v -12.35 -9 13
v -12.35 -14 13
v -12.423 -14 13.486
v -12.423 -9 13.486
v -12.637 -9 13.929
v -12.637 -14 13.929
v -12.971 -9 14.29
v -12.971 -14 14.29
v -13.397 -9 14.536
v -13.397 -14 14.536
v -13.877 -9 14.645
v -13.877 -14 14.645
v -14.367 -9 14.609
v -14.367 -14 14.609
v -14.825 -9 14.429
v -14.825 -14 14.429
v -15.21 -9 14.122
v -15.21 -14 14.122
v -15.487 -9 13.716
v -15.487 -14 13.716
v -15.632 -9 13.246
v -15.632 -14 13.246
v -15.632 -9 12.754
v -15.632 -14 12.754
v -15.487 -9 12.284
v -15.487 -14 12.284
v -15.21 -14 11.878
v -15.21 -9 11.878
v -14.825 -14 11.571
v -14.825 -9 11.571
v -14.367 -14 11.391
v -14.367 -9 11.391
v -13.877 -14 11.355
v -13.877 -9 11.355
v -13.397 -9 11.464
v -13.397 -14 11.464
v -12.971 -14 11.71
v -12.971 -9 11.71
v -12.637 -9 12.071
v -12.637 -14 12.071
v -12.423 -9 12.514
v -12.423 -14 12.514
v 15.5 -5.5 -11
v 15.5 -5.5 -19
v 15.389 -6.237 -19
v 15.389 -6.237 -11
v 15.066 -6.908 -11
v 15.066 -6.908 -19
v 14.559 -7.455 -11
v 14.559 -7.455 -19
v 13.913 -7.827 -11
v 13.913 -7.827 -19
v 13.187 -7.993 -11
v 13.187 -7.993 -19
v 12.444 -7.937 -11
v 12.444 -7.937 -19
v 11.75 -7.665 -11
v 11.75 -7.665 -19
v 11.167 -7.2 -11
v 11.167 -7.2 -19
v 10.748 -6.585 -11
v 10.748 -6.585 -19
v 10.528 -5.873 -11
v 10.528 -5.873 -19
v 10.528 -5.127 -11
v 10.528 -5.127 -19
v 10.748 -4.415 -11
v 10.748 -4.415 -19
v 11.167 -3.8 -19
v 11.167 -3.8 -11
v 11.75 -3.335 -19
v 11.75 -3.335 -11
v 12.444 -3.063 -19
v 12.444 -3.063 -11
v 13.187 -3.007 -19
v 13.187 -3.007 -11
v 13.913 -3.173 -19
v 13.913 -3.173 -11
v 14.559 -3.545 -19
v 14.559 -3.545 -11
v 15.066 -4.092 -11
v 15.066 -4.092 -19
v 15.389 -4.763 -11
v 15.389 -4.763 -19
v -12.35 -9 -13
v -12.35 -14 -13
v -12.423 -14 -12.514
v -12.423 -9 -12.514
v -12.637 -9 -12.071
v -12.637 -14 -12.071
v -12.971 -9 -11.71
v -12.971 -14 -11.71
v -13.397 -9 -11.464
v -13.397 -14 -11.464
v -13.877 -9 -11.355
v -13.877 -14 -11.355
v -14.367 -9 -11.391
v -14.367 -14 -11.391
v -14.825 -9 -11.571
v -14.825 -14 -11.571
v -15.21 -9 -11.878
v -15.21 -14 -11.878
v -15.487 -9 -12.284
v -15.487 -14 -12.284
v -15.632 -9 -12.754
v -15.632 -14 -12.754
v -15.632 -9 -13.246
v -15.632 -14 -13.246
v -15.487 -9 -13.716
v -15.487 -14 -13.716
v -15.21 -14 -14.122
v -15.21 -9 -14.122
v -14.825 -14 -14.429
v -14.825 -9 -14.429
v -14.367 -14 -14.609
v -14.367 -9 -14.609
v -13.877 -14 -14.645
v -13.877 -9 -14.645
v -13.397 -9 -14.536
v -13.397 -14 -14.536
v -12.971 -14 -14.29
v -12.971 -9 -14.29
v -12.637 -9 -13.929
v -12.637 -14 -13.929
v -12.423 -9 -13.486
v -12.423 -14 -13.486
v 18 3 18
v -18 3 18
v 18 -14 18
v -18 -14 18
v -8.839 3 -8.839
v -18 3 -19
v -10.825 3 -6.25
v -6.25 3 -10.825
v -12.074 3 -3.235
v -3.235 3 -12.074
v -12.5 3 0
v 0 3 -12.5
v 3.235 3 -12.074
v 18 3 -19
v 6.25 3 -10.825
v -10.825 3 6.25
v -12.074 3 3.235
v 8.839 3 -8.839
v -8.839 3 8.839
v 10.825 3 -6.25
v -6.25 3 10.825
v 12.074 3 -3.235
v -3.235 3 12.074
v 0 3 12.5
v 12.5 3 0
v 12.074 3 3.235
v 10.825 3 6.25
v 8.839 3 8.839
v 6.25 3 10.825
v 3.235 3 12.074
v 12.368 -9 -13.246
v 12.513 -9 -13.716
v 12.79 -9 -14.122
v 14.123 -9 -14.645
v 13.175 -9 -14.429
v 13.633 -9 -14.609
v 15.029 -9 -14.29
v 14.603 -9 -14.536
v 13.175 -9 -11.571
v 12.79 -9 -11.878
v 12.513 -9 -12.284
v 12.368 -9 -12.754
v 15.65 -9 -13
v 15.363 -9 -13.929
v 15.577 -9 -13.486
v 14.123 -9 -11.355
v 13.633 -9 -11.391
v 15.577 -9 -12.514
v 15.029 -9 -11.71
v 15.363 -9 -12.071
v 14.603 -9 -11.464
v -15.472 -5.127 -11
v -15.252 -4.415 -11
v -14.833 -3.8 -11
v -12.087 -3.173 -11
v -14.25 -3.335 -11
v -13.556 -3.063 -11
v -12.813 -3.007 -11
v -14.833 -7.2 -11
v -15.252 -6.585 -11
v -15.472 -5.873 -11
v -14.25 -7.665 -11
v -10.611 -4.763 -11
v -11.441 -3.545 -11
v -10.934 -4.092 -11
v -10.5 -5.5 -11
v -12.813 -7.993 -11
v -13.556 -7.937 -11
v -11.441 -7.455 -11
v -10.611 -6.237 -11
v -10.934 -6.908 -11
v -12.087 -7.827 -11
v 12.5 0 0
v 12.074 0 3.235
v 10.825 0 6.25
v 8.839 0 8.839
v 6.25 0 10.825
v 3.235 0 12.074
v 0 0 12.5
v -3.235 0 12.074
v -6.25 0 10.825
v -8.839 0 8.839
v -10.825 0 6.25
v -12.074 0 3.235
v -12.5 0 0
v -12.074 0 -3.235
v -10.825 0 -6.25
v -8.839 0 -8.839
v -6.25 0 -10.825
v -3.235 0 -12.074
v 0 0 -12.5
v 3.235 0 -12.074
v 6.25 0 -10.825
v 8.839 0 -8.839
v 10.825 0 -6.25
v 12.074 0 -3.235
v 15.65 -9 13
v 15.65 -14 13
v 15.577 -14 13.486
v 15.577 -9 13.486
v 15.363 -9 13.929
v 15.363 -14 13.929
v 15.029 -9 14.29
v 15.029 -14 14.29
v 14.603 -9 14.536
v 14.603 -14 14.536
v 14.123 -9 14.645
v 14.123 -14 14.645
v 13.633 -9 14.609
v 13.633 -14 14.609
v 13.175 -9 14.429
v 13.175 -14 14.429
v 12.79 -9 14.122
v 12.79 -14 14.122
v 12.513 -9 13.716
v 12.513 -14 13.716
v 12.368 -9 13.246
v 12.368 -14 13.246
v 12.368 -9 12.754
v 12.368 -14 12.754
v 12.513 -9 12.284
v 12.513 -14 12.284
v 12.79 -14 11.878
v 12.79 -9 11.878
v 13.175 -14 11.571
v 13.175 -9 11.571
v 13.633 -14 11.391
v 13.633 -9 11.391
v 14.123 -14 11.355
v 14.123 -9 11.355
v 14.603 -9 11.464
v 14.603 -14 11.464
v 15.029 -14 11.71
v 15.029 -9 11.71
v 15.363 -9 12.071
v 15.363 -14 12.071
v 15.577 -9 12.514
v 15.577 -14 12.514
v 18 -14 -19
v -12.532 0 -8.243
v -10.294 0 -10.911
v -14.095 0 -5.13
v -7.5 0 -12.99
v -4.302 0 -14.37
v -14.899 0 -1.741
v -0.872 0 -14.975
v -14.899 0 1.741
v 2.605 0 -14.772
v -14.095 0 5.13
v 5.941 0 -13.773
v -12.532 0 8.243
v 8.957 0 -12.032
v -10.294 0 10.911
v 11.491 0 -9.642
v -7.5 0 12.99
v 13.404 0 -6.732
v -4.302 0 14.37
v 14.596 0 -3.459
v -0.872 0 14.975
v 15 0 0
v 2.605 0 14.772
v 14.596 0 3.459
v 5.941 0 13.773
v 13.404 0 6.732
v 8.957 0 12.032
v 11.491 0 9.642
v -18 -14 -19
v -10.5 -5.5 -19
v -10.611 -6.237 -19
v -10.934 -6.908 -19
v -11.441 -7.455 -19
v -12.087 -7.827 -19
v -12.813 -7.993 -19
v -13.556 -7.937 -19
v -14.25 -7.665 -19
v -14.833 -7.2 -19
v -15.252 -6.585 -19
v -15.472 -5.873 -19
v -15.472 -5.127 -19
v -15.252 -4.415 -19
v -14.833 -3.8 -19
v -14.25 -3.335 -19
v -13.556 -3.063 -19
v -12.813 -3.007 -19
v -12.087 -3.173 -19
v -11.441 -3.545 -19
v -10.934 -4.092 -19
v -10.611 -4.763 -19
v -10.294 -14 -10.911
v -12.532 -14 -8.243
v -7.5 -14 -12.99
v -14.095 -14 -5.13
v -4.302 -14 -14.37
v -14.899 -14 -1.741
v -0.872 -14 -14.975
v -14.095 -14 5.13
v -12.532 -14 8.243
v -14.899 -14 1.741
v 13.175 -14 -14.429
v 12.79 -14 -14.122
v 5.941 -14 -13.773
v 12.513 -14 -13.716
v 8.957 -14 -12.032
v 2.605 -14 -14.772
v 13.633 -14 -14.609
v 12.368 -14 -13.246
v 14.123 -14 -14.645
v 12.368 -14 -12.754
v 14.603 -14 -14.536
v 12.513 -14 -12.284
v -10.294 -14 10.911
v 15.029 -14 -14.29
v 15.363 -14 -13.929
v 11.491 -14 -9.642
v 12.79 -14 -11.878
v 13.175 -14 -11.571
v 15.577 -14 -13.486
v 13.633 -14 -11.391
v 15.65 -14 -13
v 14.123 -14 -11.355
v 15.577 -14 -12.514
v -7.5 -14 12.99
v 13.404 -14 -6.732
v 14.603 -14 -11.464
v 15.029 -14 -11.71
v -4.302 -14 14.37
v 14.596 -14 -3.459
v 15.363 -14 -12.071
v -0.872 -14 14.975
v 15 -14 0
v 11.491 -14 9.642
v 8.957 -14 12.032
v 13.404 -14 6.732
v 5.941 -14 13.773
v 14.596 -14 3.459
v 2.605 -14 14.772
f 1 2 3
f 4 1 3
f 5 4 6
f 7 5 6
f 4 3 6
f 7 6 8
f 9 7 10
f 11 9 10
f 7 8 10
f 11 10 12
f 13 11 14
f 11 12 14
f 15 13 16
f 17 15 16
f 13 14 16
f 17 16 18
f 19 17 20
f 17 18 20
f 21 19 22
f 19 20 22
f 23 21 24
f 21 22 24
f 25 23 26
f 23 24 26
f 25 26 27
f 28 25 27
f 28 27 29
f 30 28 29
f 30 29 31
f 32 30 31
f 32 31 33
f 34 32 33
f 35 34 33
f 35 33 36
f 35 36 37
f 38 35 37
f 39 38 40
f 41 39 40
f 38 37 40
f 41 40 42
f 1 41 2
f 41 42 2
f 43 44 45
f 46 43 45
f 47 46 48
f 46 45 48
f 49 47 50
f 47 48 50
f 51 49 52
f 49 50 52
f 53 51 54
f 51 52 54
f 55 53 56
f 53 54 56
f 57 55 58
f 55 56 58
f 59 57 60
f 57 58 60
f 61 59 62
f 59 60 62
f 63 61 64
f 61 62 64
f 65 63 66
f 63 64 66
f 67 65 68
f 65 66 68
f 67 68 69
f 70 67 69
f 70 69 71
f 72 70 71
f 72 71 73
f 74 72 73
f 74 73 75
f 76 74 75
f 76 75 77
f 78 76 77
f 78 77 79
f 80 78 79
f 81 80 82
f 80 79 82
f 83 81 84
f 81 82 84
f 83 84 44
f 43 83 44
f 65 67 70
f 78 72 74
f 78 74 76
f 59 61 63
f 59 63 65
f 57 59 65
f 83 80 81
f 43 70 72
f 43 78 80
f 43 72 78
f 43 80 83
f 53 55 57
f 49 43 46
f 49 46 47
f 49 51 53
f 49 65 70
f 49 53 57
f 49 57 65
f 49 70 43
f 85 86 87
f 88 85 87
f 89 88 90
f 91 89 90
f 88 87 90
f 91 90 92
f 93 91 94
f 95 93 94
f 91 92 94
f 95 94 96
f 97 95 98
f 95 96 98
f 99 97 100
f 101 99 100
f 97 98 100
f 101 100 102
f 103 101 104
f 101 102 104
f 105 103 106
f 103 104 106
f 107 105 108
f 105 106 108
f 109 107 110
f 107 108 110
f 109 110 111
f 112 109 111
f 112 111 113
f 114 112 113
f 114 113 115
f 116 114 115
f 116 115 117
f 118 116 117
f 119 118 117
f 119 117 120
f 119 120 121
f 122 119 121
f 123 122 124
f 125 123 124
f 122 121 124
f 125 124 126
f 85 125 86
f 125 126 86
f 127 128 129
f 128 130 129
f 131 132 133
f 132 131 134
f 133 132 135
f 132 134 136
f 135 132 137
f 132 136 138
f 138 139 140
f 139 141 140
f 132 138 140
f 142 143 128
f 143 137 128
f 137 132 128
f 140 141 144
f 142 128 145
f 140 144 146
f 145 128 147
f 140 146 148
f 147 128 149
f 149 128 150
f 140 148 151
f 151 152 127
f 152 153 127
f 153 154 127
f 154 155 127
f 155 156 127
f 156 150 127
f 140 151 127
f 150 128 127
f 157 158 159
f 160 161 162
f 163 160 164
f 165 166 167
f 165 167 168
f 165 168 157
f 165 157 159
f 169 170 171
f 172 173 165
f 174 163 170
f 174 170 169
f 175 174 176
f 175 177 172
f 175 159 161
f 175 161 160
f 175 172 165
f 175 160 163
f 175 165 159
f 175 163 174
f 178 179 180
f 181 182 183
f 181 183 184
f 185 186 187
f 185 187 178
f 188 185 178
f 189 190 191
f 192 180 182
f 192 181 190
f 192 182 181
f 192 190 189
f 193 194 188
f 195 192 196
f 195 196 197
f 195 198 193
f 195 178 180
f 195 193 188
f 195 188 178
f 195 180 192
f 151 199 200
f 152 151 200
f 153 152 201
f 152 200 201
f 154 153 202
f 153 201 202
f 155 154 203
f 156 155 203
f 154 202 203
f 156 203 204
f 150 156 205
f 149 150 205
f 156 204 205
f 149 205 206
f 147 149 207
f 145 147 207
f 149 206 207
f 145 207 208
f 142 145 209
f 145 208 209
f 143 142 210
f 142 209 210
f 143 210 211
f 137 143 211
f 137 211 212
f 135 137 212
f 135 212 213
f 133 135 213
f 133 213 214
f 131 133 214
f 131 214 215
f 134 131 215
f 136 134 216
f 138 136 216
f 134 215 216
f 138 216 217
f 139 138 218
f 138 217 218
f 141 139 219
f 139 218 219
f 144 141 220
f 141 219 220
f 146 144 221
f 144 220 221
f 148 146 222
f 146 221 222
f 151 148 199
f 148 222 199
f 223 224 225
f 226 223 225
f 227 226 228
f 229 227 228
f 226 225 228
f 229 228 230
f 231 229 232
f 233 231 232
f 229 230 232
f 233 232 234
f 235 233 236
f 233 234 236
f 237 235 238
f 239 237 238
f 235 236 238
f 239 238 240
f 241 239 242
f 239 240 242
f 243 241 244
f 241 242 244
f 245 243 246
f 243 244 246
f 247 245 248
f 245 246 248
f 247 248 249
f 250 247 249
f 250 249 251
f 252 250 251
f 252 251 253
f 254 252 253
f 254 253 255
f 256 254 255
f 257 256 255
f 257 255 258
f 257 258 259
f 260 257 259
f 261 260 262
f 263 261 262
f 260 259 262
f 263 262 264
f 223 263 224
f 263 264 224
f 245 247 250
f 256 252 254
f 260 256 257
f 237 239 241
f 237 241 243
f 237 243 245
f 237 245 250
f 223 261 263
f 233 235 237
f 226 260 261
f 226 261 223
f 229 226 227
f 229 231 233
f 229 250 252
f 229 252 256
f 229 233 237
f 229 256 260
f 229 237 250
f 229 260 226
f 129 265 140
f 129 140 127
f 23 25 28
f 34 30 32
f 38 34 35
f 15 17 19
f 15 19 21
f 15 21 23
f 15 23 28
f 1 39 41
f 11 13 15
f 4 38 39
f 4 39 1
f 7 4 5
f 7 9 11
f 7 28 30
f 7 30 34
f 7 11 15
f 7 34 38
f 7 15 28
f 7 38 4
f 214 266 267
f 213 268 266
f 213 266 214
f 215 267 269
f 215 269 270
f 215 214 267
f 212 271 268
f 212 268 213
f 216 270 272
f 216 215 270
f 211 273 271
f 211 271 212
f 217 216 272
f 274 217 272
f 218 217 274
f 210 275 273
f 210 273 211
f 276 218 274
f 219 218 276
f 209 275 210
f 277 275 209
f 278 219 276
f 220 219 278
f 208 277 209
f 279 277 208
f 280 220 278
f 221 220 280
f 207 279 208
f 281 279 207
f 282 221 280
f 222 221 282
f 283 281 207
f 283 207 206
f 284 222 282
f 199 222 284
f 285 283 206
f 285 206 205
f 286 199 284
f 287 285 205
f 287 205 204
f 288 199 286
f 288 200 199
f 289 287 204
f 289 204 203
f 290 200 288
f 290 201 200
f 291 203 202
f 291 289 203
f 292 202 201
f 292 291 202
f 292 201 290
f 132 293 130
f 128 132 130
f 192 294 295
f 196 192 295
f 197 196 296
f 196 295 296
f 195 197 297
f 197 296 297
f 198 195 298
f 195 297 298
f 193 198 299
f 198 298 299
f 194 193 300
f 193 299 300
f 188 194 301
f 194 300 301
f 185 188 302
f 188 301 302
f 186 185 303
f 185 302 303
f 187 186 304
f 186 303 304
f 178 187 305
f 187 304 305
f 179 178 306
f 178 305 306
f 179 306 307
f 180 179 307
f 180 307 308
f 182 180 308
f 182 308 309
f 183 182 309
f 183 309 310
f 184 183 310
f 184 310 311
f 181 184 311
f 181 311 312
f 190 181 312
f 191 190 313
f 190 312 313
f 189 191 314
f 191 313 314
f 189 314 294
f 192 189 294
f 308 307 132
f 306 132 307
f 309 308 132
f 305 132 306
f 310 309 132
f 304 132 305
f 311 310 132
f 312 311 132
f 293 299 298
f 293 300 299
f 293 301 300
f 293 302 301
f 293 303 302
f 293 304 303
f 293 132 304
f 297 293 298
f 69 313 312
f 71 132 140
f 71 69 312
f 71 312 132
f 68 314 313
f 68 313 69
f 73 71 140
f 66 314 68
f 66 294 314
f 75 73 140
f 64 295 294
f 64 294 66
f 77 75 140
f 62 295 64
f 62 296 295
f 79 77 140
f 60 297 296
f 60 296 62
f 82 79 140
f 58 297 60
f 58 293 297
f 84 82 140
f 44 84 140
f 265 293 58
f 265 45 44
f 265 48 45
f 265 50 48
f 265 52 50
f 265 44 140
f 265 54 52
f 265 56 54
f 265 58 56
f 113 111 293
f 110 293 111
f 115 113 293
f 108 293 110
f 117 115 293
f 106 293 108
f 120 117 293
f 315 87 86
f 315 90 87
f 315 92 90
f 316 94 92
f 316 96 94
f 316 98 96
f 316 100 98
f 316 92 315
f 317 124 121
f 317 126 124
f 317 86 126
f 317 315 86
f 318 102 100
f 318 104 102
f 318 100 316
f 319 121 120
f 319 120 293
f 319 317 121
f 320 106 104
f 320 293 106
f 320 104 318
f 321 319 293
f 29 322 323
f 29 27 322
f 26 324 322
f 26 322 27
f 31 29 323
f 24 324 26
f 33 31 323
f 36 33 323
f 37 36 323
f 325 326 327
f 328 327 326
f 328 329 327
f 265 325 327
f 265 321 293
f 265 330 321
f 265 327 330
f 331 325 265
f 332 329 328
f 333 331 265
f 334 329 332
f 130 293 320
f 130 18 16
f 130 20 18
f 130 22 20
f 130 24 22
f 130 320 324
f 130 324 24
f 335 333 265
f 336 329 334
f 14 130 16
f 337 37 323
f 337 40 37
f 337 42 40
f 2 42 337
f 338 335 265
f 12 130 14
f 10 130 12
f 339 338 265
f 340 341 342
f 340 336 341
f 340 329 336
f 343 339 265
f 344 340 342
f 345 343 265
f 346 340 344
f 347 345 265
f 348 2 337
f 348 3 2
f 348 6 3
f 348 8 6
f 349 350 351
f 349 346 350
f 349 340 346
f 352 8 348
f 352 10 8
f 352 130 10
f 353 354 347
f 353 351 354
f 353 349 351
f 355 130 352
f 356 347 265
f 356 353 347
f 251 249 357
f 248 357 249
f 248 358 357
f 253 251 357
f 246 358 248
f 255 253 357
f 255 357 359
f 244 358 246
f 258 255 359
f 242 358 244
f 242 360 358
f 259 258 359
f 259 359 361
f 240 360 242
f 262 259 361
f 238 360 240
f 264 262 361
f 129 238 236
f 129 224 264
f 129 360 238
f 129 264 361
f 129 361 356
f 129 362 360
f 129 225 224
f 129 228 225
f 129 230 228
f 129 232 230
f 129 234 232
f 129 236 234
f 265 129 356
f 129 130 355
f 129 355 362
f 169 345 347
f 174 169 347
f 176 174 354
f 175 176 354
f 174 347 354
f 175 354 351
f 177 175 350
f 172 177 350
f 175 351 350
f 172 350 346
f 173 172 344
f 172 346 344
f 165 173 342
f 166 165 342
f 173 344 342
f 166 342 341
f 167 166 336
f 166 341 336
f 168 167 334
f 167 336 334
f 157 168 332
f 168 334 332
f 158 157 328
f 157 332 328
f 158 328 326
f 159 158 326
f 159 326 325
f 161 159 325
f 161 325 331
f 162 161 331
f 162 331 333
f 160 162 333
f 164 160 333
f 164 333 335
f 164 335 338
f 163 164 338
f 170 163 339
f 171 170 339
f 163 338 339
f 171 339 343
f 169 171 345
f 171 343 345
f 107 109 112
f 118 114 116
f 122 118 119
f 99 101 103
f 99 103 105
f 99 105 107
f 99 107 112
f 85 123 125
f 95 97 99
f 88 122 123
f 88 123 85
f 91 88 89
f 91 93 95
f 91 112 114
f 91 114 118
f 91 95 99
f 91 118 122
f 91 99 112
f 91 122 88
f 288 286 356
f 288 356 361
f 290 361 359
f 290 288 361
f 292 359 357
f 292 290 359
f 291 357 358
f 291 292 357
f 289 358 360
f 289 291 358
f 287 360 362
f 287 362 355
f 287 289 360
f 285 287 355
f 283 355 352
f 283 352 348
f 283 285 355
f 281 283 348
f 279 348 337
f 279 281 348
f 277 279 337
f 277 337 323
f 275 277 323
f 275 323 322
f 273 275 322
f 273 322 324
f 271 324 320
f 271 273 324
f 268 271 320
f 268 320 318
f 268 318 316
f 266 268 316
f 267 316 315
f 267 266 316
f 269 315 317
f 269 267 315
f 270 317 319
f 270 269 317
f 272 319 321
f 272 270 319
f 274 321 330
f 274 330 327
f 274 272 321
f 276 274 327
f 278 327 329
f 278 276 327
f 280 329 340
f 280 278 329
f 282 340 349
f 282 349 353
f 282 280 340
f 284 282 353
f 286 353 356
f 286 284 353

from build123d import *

# Parameters (mm, degrees)
F0_W     = 36
F0_H     = 37
F0_R     = 15
F1_DEPTH = 14
F0_R_2   = 12.5
F2_DEPTH = 3
F3_R     = 1.65
F4_DEPTH = 5
F5_R     = 2.5
F6_DEPTH = 8


with BuildPart() as f1:
    # F0 (on Front) → F1 (new body)
    with BuildSketch(Plane.XZ):
        with Locations((0, -0.5)):
            Rectangle(F0_W, F0_H)
        Circle(F0_R, mode=Mode.SUBTRACT)
    extrude(amount=F1_DEPTH)

    # F0 (on Front) → F2 (join)
    with BuildSketch(Plane.XZ):
        with Locations((0, -0.5)):
            Rectangle(F0_W, F0_H)
        Circle(F0_R, mode=Mode.SUBTRACT)
        Circle(F0_R)
        Circle(F0_R_2, mode=Mode.SUBTRACT)
    extrude(amount=-F2_DEPTH)

    # F3 (on face) → F4 (cut)
    with BuildSketch(Plane.XZ.offset(14)):
        with Locations((-14, 13)):
            Circle(F3_R)
        with Locations((-14, -13)):
            Circle(F3_R)
        with Locations((14, -13)):
            Circle(F3_R)
        with Locations((14, 13)):
            Circle(F3_R)
    extrude(amount=-F4_DEPTH, mode=Mode.SUBTRACT)

    # F5 (on face) → F6 (cut)
    with BuildSketch(Plane(origin=(0, 0, -19), x_dir=(1, 0, 0), z_dir=(0, 0, -1))):
        with Locations((-13, 5.5)):
            Circle(F5_R)
        with Locations((13, 5.5)):
            Circle(F5_R)
    extrude(amount=-F6_DEPTH, mode=Mode.SUBTRACT)


solid = f1.part
